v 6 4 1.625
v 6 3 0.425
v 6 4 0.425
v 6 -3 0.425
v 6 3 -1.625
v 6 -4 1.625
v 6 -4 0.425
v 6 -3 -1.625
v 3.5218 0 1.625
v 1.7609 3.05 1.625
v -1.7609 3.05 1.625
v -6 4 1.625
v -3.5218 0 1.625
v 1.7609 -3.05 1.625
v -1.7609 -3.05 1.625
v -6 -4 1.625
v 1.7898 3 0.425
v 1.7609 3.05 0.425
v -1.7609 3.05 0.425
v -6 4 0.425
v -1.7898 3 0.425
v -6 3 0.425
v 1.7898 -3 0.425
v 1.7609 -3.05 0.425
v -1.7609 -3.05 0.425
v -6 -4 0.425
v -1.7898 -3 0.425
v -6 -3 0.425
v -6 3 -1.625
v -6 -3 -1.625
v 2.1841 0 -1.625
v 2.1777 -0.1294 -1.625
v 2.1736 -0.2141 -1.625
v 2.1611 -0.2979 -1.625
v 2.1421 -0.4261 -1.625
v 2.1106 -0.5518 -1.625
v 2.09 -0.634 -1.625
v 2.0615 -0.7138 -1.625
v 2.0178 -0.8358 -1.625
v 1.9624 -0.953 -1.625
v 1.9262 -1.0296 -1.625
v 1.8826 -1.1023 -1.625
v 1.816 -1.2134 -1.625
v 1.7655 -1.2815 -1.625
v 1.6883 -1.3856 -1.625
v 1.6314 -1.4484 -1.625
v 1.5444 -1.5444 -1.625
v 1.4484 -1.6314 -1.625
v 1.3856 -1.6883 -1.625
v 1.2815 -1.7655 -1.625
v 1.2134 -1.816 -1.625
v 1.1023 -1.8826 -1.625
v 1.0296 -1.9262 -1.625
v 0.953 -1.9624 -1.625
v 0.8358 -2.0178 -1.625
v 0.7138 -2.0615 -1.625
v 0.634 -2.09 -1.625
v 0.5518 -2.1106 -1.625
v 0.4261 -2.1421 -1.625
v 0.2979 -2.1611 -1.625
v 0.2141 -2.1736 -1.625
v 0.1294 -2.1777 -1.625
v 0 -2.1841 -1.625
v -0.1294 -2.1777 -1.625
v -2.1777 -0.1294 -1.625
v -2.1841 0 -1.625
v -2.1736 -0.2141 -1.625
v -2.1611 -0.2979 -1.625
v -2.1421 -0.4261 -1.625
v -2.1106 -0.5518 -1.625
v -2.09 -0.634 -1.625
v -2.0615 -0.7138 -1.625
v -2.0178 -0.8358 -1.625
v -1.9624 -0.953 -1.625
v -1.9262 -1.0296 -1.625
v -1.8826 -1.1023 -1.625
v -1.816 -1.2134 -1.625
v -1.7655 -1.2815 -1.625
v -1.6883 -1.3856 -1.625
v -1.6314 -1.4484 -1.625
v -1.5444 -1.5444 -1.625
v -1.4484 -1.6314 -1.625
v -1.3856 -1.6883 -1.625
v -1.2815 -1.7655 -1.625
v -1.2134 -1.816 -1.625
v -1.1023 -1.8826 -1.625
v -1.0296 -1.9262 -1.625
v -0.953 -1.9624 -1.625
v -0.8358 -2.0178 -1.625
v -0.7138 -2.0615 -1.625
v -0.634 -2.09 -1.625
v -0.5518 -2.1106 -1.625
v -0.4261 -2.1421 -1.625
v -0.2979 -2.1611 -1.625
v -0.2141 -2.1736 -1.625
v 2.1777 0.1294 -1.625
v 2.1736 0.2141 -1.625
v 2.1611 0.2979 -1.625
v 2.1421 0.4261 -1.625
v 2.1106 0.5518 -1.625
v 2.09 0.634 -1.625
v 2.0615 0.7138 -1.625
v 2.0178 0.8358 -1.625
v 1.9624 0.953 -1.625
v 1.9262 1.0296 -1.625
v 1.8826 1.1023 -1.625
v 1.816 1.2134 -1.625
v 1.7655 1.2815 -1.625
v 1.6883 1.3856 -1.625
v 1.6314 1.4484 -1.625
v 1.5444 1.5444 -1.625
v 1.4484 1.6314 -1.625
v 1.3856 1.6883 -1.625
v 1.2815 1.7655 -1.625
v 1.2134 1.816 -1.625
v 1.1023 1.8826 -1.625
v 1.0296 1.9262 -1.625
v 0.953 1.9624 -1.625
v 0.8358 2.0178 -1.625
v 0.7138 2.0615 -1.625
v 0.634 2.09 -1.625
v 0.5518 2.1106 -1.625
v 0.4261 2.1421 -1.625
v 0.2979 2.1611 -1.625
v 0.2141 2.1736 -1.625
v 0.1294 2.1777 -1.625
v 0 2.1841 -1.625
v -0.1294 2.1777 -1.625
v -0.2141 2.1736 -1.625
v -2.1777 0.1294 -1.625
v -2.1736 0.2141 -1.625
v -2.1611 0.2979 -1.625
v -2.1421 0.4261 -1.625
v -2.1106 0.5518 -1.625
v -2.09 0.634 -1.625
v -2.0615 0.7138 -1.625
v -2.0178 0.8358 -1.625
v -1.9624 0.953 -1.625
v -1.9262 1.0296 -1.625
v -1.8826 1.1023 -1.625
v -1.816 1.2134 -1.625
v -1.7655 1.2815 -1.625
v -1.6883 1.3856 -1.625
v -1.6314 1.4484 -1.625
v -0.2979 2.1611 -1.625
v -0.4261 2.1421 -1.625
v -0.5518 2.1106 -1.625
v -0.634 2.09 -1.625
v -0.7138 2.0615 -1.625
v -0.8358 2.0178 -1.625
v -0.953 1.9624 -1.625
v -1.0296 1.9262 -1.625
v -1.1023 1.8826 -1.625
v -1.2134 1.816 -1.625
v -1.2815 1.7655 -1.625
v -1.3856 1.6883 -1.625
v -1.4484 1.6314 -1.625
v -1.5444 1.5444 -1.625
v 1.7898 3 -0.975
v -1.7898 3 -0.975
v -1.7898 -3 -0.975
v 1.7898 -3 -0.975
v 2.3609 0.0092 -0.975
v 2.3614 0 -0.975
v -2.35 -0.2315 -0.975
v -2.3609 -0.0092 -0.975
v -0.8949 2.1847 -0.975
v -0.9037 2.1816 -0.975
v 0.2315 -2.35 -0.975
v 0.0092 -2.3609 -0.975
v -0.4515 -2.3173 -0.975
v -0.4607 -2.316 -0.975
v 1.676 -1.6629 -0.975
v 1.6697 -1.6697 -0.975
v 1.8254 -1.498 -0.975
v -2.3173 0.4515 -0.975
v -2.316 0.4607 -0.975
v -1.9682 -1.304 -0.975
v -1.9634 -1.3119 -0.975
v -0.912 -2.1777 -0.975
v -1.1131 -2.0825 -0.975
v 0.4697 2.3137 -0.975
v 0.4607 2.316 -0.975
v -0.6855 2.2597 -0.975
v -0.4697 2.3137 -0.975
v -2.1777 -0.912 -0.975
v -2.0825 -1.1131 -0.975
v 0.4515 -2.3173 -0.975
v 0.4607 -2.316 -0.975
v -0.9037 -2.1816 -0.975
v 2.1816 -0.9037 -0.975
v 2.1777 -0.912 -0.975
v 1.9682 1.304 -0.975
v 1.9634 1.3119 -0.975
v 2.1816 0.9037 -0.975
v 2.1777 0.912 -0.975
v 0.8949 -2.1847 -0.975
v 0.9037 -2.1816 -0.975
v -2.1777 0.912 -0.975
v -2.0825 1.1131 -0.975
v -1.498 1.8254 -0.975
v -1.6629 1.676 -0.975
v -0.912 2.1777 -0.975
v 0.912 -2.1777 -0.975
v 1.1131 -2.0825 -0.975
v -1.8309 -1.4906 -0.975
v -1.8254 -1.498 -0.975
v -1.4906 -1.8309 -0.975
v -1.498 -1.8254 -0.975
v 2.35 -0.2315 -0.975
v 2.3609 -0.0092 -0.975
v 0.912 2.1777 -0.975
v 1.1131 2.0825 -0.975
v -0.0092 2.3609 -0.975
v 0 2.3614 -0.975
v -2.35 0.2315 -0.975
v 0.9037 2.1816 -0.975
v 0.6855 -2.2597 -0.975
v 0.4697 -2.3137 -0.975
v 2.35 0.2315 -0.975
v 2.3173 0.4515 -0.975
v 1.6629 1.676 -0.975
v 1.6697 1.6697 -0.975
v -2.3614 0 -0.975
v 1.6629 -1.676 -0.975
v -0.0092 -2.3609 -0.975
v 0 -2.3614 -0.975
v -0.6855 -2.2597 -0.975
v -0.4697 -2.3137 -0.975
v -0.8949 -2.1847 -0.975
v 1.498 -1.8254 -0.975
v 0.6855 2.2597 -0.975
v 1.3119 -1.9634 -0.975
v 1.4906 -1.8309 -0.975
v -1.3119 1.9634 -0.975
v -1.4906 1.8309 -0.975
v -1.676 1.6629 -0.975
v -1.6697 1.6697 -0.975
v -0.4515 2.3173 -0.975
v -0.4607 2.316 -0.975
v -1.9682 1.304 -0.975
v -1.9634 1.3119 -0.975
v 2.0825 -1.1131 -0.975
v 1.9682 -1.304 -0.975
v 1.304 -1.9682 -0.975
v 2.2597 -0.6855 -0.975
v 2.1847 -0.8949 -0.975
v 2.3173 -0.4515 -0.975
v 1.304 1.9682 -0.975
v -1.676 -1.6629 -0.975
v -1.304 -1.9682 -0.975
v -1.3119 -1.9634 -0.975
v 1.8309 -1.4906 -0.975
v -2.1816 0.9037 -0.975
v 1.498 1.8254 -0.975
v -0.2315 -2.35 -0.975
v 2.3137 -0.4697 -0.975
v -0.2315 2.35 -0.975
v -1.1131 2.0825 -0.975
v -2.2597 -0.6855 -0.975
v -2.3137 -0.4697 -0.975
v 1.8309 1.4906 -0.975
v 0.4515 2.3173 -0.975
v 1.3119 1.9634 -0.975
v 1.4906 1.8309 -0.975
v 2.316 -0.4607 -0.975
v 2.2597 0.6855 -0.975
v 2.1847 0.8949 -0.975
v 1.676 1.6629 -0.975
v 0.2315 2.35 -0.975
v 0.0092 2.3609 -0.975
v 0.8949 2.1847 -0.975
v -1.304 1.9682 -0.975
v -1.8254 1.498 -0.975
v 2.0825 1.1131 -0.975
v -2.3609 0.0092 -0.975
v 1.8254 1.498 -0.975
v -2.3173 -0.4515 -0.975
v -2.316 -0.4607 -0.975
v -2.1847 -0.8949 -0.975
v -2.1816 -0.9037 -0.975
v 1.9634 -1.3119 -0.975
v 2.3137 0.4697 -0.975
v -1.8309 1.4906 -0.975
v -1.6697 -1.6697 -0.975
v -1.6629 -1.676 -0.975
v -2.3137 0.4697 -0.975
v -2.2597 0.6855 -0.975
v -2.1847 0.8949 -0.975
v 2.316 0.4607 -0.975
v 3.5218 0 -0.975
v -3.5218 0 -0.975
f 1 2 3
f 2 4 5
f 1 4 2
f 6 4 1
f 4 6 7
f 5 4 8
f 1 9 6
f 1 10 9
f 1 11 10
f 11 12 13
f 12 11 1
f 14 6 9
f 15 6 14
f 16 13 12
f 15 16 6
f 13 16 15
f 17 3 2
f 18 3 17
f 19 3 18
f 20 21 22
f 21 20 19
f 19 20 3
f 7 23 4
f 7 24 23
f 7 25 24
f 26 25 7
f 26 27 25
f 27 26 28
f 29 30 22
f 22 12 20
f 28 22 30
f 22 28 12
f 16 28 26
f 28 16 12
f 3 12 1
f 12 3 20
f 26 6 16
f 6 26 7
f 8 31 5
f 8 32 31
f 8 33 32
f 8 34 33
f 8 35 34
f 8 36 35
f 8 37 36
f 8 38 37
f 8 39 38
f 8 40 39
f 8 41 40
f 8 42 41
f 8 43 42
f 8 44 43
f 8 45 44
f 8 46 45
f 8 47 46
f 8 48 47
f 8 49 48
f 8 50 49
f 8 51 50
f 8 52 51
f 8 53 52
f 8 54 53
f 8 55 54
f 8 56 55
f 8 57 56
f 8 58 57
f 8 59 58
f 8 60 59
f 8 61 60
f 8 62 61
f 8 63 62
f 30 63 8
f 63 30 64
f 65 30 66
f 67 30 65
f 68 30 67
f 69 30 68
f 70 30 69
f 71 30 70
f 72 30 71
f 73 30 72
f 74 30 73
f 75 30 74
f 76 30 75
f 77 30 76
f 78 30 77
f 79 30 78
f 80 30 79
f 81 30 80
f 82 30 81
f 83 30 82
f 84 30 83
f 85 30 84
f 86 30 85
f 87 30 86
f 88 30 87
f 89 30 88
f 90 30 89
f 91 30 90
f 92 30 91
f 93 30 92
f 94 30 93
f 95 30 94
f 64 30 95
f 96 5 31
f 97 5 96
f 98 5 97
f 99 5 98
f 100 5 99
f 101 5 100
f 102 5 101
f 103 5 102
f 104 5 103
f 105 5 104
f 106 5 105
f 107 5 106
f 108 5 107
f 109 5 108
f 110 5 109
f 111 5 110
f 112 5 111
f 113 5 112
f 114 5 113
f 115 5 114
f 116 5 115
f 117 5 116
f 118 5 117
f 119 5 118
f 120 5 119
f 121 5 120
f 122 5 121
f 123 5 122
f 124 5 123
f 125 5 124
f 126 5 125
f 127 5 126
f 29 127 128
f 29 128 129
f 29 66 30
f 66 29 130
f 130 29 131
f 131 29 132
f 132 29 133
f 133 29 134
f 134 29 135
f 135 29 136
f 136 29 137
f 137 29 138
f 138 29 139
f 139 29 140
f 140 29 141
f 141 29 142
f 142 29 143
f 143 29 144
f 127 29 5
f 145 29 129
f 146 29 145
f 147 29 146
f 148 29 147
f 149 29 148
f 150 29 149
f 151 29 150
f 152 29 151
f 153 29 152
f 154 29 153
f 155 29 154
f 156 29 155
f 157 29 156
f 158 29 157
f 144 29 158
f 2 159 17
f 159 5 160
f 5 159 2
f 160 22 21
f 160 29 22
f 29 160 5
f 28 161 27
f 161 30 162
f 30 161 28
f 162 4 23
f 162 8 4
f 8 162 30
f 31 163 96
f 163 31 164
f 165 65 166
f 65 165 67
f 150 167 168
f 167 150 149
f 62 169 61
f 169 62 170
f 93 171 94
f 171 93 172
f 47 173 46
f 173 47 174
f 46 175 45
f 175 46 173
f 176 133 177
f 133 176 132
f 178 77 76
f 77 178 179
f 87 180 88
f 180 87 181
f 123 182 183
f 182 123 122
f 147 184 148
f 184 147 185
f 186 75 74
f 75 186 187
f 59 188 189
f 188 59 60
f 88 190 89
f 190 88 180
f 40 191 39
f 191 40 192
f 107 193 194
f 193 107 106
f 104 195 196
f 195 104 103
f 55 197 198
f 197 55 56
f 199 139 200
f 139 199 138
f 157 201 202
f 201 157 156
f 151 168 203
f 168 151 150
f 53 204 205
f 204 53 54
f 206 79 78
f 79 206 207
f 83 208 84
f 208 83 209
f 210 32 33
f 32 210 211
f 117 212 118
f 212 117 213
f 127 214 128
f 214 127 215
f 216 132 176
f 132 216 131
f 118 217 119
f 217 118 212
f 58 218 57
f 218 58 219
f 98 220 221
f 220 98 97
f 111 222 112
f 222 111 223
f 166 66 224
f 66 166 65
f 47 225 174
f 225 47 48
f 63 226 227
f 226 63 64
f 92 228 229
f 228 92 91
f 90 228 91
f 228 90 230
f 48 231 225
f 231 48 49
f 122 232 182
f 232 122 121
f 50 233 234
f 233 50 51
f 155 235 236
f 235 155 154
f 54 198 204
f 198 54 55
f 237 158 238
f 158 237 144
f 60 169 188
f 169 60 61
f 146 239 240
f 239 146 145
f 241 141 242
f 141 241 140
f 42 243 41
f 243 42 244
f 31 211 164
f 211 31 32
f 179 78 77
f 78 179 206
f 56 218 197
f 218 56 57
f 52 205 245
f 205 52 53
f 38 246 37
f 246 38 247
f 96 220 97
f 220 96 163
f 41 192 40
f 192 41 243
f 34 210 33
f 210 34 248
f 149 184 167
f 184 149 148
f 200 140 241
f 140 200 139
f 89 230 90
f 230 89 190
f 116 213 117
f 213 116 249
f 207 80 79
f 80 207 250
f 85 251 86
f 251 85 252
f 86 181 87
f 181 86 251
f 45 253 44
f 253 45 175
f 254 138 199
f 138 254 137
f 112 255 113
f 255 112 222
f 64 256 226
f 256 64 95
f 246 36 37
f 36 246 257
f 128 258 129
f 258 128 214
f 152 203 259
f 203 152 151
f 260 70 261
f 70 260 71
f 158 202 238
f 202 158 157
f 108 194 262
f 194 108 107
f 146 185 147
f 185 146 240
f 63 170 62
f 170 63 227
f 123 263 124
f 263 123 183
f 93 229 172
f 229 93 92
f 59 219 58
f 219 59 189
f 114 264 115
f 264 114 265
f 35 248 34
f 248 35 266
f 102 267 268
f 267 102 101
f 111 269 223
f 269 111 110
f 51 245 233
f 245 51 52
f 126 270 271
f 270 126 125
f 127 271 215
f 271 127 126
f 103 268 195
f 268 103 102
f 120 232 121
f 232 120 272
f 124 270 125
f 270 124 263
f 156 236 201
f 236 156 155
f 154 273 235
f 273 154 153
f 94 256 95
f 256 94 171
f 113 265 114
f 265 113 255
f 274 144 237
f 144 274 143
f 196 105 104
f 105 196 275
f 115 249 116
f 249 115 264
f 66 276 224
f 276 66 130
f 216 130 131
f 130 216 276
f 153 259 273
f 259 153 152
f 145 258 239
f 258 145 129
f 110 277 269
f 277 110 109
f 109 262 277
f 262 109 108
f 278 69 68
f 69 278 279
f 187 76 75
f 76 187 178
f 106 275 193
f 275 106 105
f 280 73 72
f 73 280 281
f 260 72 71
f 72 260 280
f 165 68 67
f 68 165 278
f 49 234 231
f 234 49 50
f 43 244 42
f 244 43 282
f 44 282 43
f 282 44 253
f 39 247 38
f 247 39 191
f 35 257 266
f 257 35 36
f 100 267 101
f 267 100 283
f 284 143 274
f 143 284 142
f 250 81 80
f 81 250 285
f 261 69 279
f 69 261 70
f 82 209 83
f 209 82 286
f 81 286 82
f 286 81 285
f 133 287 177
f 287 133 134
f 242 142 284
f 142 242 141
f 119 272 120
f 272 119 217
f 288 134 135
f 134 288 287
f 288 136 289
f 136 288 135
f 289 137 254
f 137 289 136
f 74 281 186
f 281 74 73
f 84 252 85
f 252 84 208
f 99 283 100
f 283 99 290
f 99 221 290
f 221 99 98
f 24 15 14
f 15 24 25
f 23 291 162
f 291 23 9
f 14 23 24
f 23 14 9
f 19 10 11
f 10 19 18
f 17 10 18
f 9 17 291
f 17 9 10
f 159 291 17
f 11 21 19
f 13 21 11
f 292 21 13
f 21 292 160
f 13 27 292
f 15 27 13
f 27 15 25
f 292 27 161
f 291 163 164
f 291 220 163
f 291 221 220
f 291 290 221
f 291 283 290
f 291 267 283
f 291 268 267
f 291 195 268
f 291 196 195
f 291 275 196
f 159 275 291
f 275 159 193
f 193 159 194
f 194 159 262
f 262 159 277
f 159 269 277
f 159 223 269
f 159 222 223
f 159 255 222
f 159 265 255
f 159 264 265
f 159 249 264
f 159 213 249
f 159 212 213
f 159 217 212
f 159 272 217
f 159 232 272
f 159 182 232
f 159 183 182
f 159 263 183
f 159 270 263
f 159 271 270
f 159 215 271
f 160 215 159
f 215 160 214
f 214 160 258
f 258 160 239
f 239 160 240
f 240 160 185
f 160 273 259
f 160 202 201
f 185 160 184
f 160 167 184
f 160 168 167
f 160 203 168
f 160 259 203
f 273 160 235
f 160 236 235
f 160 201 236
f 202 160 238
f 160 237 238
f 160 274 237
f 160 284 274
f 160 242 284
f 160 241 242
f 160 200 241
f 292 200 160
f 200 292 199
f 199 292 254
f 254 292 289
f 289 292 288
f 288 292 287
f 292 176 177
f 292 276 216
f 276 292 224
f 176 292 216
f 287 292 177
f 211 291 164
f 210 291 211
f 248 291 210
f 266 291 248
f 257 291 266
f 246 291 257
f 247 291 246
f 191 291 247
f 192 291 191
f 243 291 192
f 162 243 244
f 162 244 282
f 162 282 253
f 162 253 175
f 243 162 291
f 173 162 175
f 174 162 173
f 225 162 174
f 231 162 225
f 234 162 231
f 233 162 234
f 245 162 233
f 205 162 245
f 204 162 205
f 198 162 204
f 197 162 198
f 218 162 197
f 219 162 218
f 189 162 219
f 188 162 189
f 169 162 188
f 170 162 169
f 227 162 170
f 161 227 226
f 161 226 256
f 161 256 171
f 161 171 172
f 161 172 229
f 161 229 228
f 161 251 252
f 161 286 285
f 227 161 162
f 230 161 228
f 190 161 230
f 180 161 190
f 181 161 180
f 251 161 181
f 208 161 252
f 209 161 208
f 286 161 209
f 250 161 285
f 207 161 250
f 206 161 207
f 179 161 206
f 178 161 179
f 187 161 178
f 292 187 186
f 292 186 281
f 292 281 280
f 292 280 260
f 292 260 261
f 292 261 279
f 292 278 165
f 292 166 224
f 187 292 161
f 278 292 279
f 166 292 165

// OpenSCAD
// T-slot nut for 4.0mm screws, 6.0mm across flats, 3.25mm thick
// One connected solid: true T-slot profile + internal hex socket + M4 clearance/tap hole.

screw_diameter = 4.0;                 //[2.0:8.0:0.1]
hole_style_clearance = 1;             //[0:1:1] 0=tap drill-ish, 1=clearance
tolerance = 0.15;                     //[0.05:0.4:0.01]
across_flats = 6.0;                   //[3.0:12.0:0.1]
thickness = 3.25;                     //[1.6:6.5:0.05]

body_length = 12.0;                   //[6.0:24.0:0.5]
t_slot_major_width = 8.0;             //[4.0:16.0:0.5]
t_slot_minor_width = 6.0;             //[3.0:12.0:0.5]

t_slot_lip_thickness = 1.2;           //[0.6:2.4:0.1]
chamfer_size = 0.3;                   //[0.1:1.0:0.05]
overlap = 0.8;                        //[0.5:2.0:0.1]

// Hex socket depth (internal hex recess), must be <= thickness
hex_socket_depth = 2.2;               //[0.8:3.25:0.05]
// Small extra clearance for the hex socket so 6.0 AF is functional after printing
hex_socket_clear = 0.10;              //[0.0:0.3:0.01]

$fn = 96;

function hex_R_from_AF(af) = af/(2*cos(30)); // circumradius for $fn=6 cylinder

module tslot_nut() {
    // Derived dimensions (keep valid)
    head_h = min(thickness, t_slot_lip_thickness);
    stem_h = max(0, thickness - head_h);

    head_w = max(t_slot_major_width, t_slot_minor_width);
    stem_w = min(t_slot_minor_width, head_w);

    // Hole sizing (clearance vs tap-ish)
    hole_d_clear = screw_diameter + tolerance;
    hole_d_tap   = max(0.1, screw_diameter - tolerance);
    hole_d = hole_d_tap*(1-hole_style_clearance) + hole_d_clear*hole_style_clearance;

    // Hex socket sizing
    hex_af = across_flats + hex_socket_clear;
    hex_r  = hex_R_from_AF(hex_af);
    sock_h = min(hex_socket_depth, thickness);

    difference() {
        // Solid: T-profile prism (this is the actual T-slot nut body)
        union() {
            // Head (wider) at top
            translate([0, 0, thickness/2 - head_h/2])
                cube([body_length, head_w, head_h], center=true);

            // Stem (narrower) below head
            if (stem_h > 0)
                translate([0, 0, -thickness/2 + stem_h/2])
                    cube([body_length, stem_w, stem_h], center=true);
        }

        // Through hole for M4
        cylinder(d=hole_d, h=thickness + 2*overlap, center=true, $fn=64);

        // Lead-in chamfers (top and bottom)
        translate([0, 0, thickness/2 - chamfer_size/2])
            cylinder(d1=hole_d + 2*chamfer_size, d2=hole_d,
                     h=chamfer_size + overlap, center=true, $fn=64);

        translate([0, 0, -thickness/2 + chamfer_size/2])
            cylinder(d1=hole_d, d2=hole_d + 2*chamfer_size,
                     h=chamfer_size + overlap, center=true, $fn=64);

        // Internal hex socket (6.0mm across flats) recessed from the top face
        // Positioned by formula so it is fully within thickness and connected.
        translate([0, 0, thickness/2 - sock_h/2])
            cylinder(r=hex_r, h=sock_h + overlap, center=true, $fn=6);
    }
}

tslot_nut();
